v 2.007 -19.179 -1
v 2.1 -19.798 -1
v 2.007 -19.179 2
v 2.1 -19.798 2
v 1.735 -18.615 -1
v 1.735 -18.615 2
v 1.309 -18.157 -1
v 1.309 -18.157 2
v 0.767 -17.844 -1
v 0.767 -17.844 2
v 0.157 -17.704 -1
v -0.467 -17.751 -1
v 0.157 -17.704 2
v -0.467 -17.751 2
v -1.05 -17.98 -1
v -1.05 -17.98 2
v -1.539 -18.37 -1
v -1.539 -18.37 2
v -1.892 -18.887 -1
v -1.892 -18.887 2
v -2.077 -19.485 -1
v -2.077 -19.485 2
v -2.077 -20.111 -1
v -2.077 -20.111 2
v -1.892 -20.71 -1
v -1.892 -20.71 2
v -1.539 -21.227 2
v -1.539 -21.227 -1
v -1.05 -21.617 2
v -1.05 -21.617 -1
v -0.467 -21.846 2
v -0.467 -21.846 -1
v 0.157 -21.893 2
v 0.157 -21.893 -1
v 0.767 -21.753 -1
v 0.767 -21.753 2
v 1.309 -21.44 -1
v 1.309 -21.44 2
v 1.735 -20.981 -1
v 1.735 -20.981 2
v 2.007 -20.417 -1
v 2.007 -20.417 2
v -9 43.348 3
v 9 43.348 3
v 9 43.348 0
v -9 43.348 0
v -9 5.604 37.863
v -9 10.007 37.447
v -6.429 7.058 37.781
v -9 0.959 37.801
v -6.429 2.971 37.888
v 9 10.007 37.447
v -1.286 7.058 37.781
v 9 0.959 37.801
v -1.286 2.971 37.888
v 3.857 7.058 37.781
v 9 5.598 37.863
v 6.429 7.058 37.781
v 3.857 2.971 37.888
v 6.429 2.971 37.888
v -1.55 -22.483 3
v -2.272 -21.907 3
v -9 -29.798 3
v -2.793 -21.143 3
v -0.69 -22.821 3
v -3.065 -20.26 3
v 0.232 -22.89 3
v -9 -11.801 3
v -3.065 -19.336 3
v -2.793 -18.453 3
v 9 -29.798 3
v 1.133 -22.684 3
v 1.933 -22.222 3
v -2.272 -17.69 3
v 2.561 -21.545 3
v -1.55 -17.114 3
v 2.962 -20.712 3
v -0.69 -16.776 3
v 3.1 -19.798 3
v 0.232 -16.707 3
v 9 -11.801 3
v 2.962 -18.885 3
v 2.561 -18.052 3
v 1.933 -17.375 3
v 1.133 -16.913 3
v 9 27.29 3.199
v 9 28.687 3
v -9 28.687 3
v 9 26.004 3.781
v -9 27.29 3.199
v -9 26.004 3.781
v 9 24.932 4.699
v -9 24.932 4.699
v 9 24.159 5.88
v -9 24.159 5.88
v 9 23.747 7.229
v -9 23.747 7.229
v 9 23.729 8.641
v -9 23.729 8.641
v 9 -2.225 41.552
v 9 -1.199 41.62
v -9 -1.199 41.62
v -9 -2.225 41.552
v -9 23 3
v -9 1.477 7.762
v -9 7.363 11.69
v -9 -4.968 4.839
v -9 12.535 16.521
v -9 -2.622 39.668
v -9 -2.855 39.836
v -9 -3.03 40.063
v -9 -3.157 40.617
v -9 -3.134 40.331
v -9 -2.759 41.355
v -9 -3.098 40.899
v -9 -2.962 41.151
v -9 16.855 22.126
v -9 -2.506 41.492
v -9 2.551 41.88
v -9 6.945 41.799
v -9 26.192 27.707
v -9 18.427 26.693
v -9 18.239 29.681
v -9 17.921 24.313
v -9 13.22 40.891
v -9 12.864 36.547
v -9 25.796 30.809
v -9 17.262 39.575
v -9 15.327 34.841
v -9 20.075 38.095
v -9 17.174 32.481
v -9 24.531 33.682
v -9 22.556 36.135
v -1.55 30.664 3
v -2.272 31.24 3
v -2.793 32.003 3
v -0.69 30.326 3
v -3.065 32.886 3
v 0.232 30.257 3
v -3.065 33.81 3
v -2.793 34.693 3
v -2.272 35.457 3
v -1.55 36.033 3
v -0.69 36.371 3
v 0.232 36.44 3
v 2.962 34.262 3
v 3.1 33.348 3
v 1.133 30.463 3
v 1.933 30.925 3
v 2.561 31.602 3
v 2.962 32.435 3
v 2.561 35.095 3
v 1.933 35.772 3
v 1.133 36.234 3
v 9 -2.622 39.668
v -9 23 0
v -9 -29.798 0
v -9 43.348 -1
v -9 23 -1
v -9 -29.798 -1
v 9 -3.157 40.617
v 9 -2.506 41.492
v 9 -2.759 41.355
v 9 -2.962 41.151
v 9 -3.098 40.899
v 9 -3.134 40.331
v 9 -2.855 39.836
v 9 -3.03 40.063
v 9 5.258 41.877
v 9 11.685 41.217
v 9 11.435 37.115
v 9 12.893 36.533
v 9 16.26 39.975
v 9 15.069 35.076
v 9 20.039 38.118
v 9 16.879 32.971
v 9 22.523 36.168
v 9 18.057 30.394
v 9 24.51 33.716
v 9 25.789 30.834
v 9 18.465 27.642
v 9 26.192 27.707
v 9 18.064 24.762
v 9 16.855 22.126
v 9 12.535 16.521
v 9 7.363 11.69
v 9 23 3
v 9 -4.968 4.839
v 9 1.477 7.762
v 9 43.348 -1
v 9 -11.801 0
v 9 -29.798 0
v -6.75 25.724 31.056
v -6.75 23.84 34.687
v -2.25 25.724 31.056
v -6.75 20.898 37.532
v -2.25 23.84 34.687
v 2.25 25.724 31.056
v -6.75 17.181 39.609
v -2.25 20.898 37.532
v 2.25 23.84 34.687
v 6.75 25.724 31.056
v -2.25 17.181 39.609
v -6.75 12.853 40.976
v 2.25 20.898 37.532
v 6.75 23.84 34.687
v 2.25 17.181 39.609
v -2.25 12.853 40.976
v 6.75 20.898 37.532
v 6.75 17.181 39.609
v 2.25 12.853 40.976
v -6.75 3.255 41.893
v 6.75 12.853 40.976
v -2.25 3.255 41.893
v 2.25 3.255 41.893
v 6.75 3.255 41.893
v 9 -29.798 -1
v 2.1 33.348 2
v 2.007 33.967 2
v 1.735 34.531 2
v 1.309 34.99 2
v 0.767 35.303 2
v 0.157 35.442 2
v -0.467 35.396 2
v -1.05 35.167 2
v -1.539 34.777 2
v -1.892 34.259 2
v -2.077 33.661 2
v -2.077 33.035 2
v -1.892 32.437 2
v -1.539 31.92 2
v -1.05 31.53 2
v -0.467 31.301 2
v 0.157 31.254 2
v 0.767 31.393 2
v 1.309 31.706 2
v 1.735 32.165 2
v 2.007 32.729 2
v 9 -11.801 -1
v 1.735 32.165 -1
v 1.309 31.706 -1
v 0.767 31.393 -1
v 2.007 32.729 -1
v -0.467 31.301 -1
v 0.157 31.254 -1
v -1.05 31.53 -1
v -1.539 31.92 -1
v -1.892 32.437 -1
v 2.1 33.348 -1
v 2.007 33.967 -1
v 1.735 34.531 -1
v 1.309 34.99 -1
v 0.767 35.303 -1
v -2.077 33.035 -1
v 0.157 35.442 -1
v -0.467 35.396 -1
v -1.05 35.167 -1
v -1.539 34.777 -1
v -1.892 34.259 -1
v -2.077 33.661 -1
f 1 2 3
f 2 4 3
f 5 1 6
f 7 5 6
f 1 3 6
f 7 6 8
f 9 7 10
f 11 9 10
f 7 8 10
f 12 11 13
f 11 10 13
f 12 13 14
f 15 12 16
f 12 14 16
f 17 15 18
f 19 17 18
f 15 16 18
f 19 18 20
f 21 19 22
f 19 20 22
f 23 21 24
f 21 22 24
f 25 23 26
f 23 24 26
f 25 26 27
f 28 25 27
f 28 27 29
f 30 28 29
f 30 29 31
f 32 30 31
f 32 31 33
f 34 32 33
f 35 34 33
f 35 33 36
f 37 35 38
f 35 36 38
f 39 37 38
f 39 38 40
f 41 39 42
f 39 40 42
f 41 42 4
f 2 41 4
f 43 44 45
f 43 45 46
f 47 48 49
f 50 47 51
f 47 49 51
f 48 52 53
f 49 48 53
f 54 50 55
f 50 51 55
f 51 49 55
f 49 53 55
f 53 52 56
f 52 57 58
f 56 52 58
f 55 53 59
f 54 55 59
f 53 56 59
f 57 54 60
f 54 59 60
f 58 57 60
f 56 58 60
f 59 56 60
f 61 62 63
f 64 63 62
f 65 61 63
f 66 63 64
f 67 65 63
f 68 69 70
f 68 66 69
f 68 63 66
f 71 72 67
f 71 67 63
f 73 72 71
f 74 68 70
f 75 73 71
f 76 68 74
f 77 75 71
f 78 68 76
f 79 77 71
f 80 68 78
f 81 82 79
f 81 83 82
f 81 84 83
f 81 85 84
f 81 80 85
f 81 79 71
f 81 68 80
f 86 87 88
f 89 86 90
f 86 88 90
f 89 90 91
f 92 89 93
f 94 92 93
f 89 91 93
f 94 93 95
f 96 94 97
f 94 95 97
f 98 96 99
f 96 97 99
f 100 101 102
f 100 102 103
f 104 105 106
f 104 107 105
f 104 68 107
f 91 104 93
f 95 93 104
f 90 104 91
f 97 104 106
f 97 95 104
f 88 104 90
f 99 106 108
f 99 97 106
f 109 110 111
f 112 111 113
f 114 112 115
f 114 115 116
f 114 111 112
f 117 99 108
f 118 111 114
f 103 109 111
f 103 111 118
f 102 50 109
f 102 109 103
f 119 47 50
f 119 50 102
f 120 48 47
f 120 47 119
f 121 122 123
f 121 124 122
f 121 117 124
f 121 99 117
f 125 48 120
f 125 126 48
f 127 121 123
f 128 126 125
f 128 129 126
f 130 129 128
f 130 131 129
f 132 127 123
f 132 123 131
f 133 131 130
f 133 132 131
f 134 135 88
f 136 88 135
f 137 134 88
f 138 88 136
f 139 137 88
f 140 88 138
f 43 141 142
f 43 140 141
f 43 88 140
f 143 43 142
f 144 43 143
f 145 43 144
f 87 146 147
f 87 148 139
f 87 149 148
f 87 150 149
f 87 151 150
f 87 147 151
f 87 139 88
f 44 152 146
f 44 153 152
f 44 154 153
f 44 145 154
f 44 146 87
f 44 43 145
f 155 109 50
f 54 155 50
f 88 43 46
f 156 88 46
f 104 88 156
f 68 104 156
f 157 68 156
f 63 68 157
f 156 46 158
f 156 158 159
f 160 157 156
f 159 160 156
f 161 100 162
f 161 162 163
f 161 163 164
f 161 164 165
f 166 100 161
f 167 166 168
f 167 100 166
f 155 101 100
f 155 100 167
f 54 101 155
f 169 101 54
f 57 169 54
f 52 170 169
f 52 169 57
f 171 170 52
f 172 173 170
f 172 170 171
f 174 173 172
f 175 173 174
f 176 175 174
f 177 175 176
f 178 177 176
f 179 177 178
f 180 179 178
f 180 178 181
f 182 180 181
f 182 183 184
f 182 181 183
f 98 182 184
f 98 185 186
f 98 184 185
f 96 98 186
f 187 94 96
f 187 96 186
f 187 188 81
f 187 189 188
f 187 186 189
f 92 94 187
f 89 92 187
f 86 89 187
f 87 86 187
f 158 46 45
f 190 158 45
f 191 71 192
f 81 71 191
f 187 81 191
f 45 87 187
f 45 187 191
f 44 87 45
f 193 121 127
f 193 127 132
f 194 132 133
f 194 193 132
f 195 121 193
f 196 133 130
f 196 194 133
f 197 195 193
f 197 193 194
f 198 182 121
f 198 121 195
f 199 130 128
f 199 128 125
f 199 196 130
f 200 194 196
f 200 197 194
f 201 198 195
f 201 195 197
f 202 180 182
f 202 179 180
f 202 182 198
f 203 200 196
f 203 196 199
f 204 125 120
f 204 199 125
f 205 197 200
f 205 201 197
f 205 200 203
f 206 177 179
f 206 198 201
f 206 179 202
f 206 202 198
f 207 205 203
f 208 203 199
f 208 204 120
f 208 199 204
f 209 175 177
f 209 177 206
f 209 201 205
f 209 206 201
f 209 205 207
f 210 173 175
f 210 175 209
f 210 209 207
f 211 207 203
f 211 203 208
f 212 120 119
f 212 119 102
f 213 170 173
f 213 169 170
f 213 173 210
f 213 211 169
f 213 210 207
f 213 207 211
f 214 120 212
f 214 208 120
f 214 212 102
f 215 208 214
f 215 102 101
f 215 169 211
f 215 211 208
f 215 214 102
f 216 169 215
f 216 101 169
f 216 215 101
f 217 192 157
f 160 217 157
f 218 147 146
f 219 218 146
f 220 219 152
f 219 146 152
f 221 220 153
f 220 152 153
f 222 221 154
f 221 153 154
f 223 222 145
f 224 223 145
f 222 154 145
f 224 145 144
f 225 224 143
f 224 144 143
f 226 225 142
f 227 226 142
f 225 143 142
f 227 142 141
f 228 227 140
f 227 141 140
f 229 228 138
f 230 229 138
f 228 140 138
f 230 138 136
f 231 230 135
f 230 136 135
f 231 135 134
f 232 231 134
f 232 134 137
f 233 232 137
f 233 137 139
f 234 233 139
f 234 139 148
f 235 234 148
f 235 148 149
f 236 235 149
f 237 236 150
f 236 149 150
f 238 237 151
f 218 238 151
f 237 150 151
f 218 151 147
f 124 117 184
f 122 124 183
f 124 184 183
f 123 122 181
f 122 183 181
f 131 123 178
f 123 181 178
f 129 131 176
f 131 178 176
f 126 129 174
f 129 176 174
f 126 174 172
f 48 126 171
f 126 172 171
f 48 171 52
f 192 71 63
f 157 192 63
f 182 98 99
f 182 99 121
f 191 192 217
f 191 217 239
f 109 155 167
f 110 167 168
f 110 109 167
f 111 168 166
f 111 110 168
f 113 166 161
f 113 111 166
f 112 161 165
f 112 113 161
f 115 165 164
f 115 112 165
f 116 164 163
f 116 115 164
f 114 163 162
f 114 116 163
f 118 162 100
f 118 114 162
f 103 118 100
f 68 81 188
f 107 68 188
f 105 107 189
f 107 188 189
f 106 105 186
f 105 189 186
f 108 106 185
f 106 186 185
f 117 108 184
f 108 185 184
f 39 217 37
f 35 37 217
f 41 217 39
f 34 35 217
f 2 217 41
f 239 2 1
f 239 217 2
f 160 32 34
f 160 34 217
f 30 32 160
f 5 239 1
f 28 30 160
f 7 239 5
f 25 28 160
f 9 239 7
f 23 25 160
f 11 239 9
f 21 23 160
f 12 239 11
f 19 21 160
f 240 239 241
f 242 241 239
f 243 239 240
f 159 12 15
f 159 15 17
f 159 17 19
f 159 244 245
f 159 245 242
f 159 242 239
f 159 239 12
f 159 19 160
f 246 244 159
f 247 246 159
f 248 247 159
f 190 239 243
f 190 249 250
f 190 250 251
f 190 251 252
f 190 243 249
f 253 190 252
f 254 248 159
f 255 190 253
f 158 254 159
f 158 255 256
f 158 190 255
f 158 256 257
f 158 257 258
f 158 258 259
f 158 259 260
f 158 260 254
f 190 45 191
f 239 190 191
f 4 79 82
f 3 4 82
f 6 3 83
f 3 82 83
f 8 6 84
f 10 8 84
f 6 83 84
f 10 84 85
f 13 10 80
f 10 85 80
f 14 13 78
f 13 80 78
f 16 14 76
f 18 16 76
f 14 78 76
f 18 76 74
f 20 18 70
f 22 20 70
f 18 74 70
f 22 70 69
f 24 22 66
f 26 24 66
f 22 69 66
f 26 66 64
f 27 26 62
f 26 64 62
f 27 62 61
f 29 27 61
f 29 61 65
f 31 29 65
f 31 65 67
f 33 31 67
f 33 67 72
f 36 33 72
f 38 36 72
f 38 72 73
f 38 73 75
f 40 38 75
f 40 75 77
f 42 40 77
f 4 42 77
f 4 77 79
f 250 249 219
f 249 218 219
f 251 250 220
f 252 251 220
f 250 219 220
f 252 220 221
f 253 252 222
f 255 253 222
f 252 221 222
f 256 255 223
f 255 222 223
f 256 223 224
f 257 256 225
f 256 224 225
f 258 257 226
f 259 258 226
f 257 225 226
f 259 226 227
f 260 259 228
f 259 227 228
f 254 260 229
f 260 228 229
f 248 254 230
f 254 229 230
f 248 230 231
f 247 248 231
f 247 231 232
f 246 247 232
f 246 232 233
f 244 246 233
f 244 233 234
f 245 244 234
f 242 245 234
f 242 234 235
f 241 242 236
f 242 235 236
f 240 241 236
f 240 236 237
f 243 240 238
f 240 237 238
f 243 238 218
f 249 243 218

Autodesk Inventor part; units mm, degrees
ref_plane "YZ Plane" through (0, 0, 0) normal (1, 0, 0) x (0, 1, 0)
ref_plane "XZ Plane" through (0, 0, 0) normal (0, 1, 0) x (-1, 0, 0)
ref_plane "XY Plane" through (0, 0, 0) normal (0, 0, 1) x (1, 0, 0)
sketch "Boceto1" plane through (0, 0, 0) normal (0, 0, 1) x (1, 0, 0)
  line L0 (15, -35) -> (-15, -35)
  line L1 (-15, -35) -> (-15, 35)
  line L2 (-15, 35) -> (15, 35)
  line L3 (15, 35) -> (15, -35)
  line L4 (15, -35) -> (-15, 35) construction
  line L5 (-15, -35) -> (15, 35) construction
  line L6 (0, 35) -> (0, -35) construction
  circle A0 centre (0, 28.5) radius 2
  line L7 (-19.7941, 0) -> (22.4931, 0) construction
  circle A1 centre (0, -28.5) radius 2
  point P0 (0, 0)
  dimension "d0" = 70
  dimension "d1" = 30
  dimension "d2" = 4
  dimension "d3" = 6.5
  dimension "d4" = 6.5
extrude "Extrusión1" add sketch "Boceto1" along normal blind 3
sketch "Boceto2" plane through (15, -35, 0) normal (1, 0, 0) x (0, 0, -1)
  line L0 (-1.8712, 18.1097) -> (-14.4034, 50.7658) construction
  line L1 (-14.4034, 50.7658) -> (-23.5228, 61.8317) construction
  line L2 (-23.5228, 61.8317) -> (-35.5227, 59.996) construction
  line L3 (-35.5227, 59.996) -> (-40.0788, 48.4605) construction
  line L4 (-40.0788, 48.4605) -> (-40.0788, 37.855) construction
  line L5 (-40.0788, 37.855) -> (-39.6332, 34.0327) construction
  spline S0 degree 4 poles (-1.8712, 18.1097) (-14.4034, 50.7658) (-23.5228, 61.8317) (-35.5227, 59.996) (-40.0788, 48.4605) (-40.0788, 37.855) (-39.6332, 34.0327) knots 1 1 1 1 1 2 3 4 4 4 4 4 construction
  line L6 (-3, 61.5) -> (-3, 65.5) projected
  line L7 (-3, 0) -> (-3, 70) projected
  line L8 (-3, 70) -> (-3, 58)
  line L9 (-3, 58) -> (-27.7071, 61.1916)
  line L10 (-3, 58) -> (-3, 23.1988)
  line L11 (-41.6198, 33.8011) -> (-41.317, 29.2142)
  line L12 (-41.317, 29.2142) -> (-37.8007, 35.959)
  arc A0 (-3, 23.1988) -> (-31.2114, 56.3416) centre (-45.8049, 15.3413) ccw
  spline S1 degree 5 poles (-27.7071, 61.1916) (-28.3861, 61.204) (-29.0661, 61.164) (-29.7416, 61.0697) (-31.212, 60.7437) (-32.6066, 60.1691) (-33.3389, 59.7849) (-34.7268, 58.894) (-35.9529, 57.791) (-36.5222, 57.195) (-37.5948, 55.9044) (-38.4921, 54.486) (-38.9051, 53.737) (-39.672, 52.1477) (-40.273, 50.4882) (-40.5424, 49.6188) (-41.0222, 47.8089) (-41.3636, 45.9678) (-41.5068, 45.0158) (-41.7361, 43.0961) (-41.8573, 41.1666) (-41.8931, 40.1963) (-41.9162, 38.3325) (-41.8502, 36.4697) (-41.7977, 35.5781) (-41.7231, 34.688) (-41.6198, 33.8011) knots 0 0 0 0 0 0 0.098265 0.098265 0.098265 0.217274 0.217274 0.217274 0.336121 0.336121 0.336121 0.459615 0.459615 0.459615 0.591158 0.591158 0.591158 0.730365 0.730365 0.730365 0.870803 0.870803 0.870803 1 1 1 1 1 1
  spline S2 degree 5 poles (-31.2114, 56.3416) (-31.6636, 56.0965) (-32.095, 55.8132) (-32.503, 55.497) (-33.3156, 54.7706) (-34.0235, 53.9412) (-34.3681, 53.4813) (-35.0445, 52.4631) (-35.6063, 51.3769) (-35.8744, 50.7865) (-36.3876, 49.5038) (-36.7878, 48.1811) (-36.9721, 47.4711) (-37.3065, 45.9717) (-37.5429, 44.4536) (-37.643, 43.6569) (-37.8023, 42.0438) (-37.8811, 40.4248) (-37.9018, 39.607) (-37.9054, 38.386) (-37.8672, 37.1658) (-37.85, 36.7633) (-37.8279, 36.3609) (-37.8007, 35.959) knots 0 0 0 0 0 0 0.114517 0.114517 0.114517 0.242166 0.242166 0.242166 0.386331 0.386331 0.386331 0.549516 0.549516 0.549516 0.72821 0.72821 0.72821 0.910298 0.910298 0.910298 1 1 1 1 1 1
  point P0 (0, 35)
  point P1 (-17.4487, 48.3553)
  point P2 (-3, 11.1175)
  point P3 (-18.9631, 49.5979)
  dimension "d7" = 2
  dimension "d9" = 12
  dimension "d10" = 24.7071
  dimension "d32" = 34.8012
  dimension "d33" = 12.0812
  dimension "d34" = 9.1194
  dimension "d35" = 11.0659
  dimension "d36" = 32.6561
  dimension "d37" = 12.5322
  dimension "d38" = 43.5201
  dimension "d39" = 10.6055
  dimension "d40" = 3.5163
  dimension "d41" = 6.7448
  dimension "d42" = 34.8008
  dimension "d43" = 20.3826
  dimension "d44" = 1.6584
  dimension "d45" = 16.556
  dimension "d46" = 13.3712
extrude "Extrusión2" add sketch "Boceto2" against normal up to surface (30 mm away)
fillet "Empalme5" radius 10 1 edges at (0, 21.3416, 31.2114)
fillet "Empalme6" radius 1 1 edges at (0, -5.7858, 41.317)
sketch "Boceto3" plane through (15, -35, 0) normal (1, 0, 0) x (0, 0, -1)
  arc A0 (-41.552, 32.7748) -> (-39.6675, 32.3783) centre (-40.5542, 32.8406) ccw projected
  line L0 (-39.6675, 32.3783) -> (-37.8007, 35.959) projected
  spline S0 degree 5 poles (-37.8007, 35.959) (-37.8279, 36.3609) (-37.85, 36.7633) (-37.8672, 37.1658) (-37.9054, 38.386) (-37.9018, 39.607) (-37.8811, 40.4248) (-37.8125, 41.8353) (-37.6827, 43.2413) (-37.6167, 43.8317) (-37.5385, 44.4206) (-37.4469, 45.0073) knots 0 0 0 0 0 0 0.222024 0.222024 0.222024 0.672714 0.672714 0.672714 1 1 1 1 1 1 projected
  spline S1 degree 2 poles (-22.1255, 51.8554) (-35.0681, 60.2487) (-37.4469, 45.0073) knots 0 0 0 1 1 1 weights 1 0.543962 1 projected
  arc A1 (-3, 23.1988) -> (-22.1255, 51.8554) centre (-45.8049, 15.3413) ccw projected
  line L1 (-3, 0) -> (-3, 23.1988) projected
  line L2 (0, 0) -> (-3, 0) projected
  line L3 (0, 70) -> (0, 0) projected
  line L4 (0, 70) -> (-3, 70) projected
  line L5 (-3, 58) -> (-3, 70) projected
  line L6 (-3, 58) -> (-27.7071, 61.1916) projected
  spline S2 degree 5 poles (-27.7071, 61.1916) (-28.3861, 61.204) (-29.0661, 61.164) (-29.7416, 61.0697) (-31.212, 60.7437) (-32.6066, 60.1691) (-33.3389, 59.7849) (-34.7268, 58.894) (-35.9529, 57.791) (-36.5222, 57.195) (-37.5948, 55.9044) (-38.4921, 54.486) (-38.9051, 53.737) (-39.672, 52.1477) (-40.273, 50.4882) (-40.5424, 49.6188) (-41.0222, 47.8089) (-41.3636, 45.9678) (-41.5068, 45.0158) (-41.7361, 43.0961) (-41.8573, 41.1666) (-41.8931, 40.1963) (-41.9162, 38.3325) (-41.8502, 36.4697) (-41.7977, 35.5781) (-41.7231, 34.688) (-41.6198, 33.8011) knots 0 0 0 0 0 0 0.098265 0.098265 0.098265 0.217274 0.217274 0.217274 0.336121 0.336121 0.336121 0.459615 0.459615 0.459615 0.591158 0.591158 0.591158 0.730365 0.730365 0.730365 0.870803 0.870803 0.870803 1 1 1 1 1 1 projected
  line L7 (-41.6198, 33.8011) -> (-41.552, 32.7748) projected
  line L8 (-3, 58) -> (-3, 23.1988)
  point P0 (0, 35)
extrude "Extrusión3" cut sketch "Boceto3" against normal blind 6 contours L7 S2 L6 L8 A1 S1 S0 L0 A0
sketch "Boceto4" plane through (-15, -35, 0) normal (-1, 0, 0) x (0, 0, 1)
  arc A0 (41.552, 32.7748) -> (39.6675, 32.3783) centre (40.5542, 32.8406) ccw projected
  line L0 (41.6198, 33.8011) -> (41.552, 32.7748) projected
  spline S0 degree 3 poles (27.7071, 61.1916) (29.0874, 61.2167) (30.4423, 60.9813) (33.0627, 59.9896) (34.2716, 59.2392) (36.6603, 57.1563) (37.7384, 55.7597) (39.8454, 52.037) (40.6354, 49.5891) (42.0928, 42.3499) (42.0185, 37.2222) (41.6198, 33.8011) knots 0 0 0 0 0.414156 0.414156 0.839985 0.839985 1.363183 1.363183 2.115437 2.115437 3.566985 3.566985 3.566985 3.566985 projected
  line L1 (3, 58) -> (27.7071, 61.1916) projected
  arc A1 (22.1255, 51.8554) -> (3, 23.1988) centre (45.8049, 15.3413) ccw projected
  spline S1 degree 3 poles (37.4469, 45.0073) (37.2461, 46.2939) (36.7959, 47.529) (35.4475, 49.757) (34.5621, 50.7287) (32.4688, 52.2779) (31.2808, 52.8407) (28.756, 53.4793) (27.4433, 53.5489) (25.4381, 53.2629) (24.7351, 53.0833) (23.3803, 52.5756) (22.7324, 52.2491) (22.1255, 51.8554) knots 0 0 0 0 0.390644 0.390644 0.781289 0.781289 1.171933 1.171933 1.562578 1.562578 1.779598 1.779598 1.996619 1.996619 1.996619 1.996619 projected
  spline S2 degree 3 poles (37.8007, 35.959) (37.9656, 38.3979) (37.96, 41.7196) (37.4469, 45.0073) knots 0 0 0 0 0.733359 0.733359 0.733359 0.733359 projected
  line L2 (39.6675, 32.3783) -> (37.8007, 35.959) projected
  line L3 (3, 58) -> (3, 23.1988) projected
  line L4 (3, 58) -> (3, 23.1988)
  arc A2 (41.552, 32.7748) -> (39.6675, 32.3783) centre (40.5542, 32.8406) ccw projected
  line L5 (41.6198, 33.8011) -> (41.552, 32.7748) projected
  spline S3 degree 3 poles (27.7071, 61.1916) (29.0874, 61.2167) (30.4423, 60.9813) (33.0627, 59.9896) (34.2716, 59.2392) (36.6603, 57.1563) (37.7384, 55.7597) (39.8454, 52.037) (40.6354, 49.5891) (42.0928, 42.3499) (42.0185, 37.2222) (41.6198, 33.8011) knots 0 0 0 0 0.414156 0.414156 0.839985 0.839985 1.363183 1.363183 2.115437 2.115437 3.566985 3.566985 3.566985 3.566985 projected
  line L6 (3, 58) -> (27.7071, 61.1916) projected
  arc A3 (22.1255, 51.8554) -> (3, 23.1988) centre (45.8049, 15.3413) ccw projected
  spline S4 degree 3 poles (37.4469, 45.0073) (37.2461, 46.2939) (36.7959, 47.529) (35.4475, 49.757) (34.5621, 50.7287) (32.4688, 52.2779) (31.2808, 52.8407) (28.756, 53.4793) (27.4433, 53.5489) (25.4381, 53.2629) (24.7351, 53.0833) (23.3803, 52.5756) (22.7324, 52.2491) (22.1255, 51.8554) knots 0 0 0 0 0.390644 0.390644 0.781289 0.781289 1.171933 1.171933 1.562578 1.562578 1.779598 1.779598 1.996619 1.996619 1.996619 1.996619 projected
  spline S5 degree 3 poles (37.8007, 35.959) (37.9656, 38.3979) (37.96, 41.7196) (37.4469, 45.0073) knots 0 0 0 0 0.733359 0.733359 0.733359 0.733359 projected
  line L7 (39.6675, 32.3783) -> (37.8007, 35.959) projected
  circle A4 centre (40.5542, 32.8406) radius 1
  point P0 (0, 35)
extrude "Extrusión4" cut sketch "Boceto4" against normal blind 6
sketch "Boceto5" plane through (0, 0, 3) normal (0, 0, 1) x (1, 0, 0)
  circle A0 centre (0, -28.5) radius 2 projected
  circle A1 centre (0, -28.5) radius 4.6184
  circle A2 centre (0, 28.5) radius 2 projected
  circle A3 centre (0, 28.5) radius 3.6227
  point P0 (0, 0)
extrude "Extrusión5" add sketch "Boceto5" against normal up to surface (3 mm away) contours A0 | A2
sketch "Boceto6" plane through (0, 0, 3) normal (0, 0, 1) x (1, 0, 0)
  circle A0 centre (0, -19.7984) radius 2.1
  line L0 (-14.9492, 6.775) -> (15, 6.775) construction
  line L1 (15, -35) -> (15, 35) projected
  line L2 (11, 25.275) -> (-11, 25.275) projected
  line L3 (9, -11.8012) -> (-9, -11.8012) projected
  circle A1 centre (0, 33.3483) radius 2.1
  line L4 (-15, -35) -> (15, -35) projected
  line L5 (-15, 35) -> (-15, -35) projected
  point P0 (0, 0)
  point P1 (11, -11.8012)
  point P2 (-11, -11.8012)
  dimension "d66" = 4.2
  dimension "d67" = 15.2016
  dimension "d68" = 15
sketch "Boceto7" plane through (0, 0, 3) normal (0, 0, 1) x (1, 0, 0)
  line L0 (-15, -35) -> (15, -35) projected
  line L1 (15, -35) -> (15, 35) projected
  line L2 (-15, -35) -> (15, -35)
  line L3 (15, -35) -> (15, -29.7984)
  line L4 (15, -29.7984) -> (-15, -29.7984)
  line L5 (-15, -29.7984) -> (-15, -35)
  circle A0 centre (0, -19.7984) radius 2.1 projected
  point P0 (0, 0)
  dimension "d51" = 10
extrude "Extrusión6" cut sketch "Boceto7" against normal blind 7 contours L5 L4 L1 L0
sketch "Boceto8" plane through (0, 0, 3) normal (0, 0, 1) x (1, 0, 0)
  line L0 (-15, 35) -> (15, 35)
  line L1 (15, 35) -> (15, 43.3483)
  line L2 (15, 43.3483) -> (-15, 43.3483)
  line L3 (-15, 43.3483) -> (-15, 35)
  circle A0 centre (0, 33.3483) radius 2.1 projected
  point P0 (0, 0)
  dimension "d54" = 10
extrude "Extrusión7" add sketch "Boceto8" against normal up to surface (3 mm away) contours L3 L2 L1 L0 A0 | A0 L0 picked at (-0.3005, 35.0816)
sketch "Boceto9" plane through (0, 0, 3) normal (0, 0, 1) x (1, 0, 0)
  line L0 (15, 43.3483) -> (-15, 43.3483) projected
  line L1 (9, -29.7984) -> (9, 43.3483)
  line L2 (-9, 43.3483) -> (-9, -29.7984)
  line L3 (-15, -29.7984) -> (15, -29.7984) projected
  line L4 (-9, -11.8012) -> (-9, 23) projected
  line L5 (9, 23) -> (9, -11.8012) projected
  line L6 (-15, 43.3483) -> (-15, -29.7984) projected
  line L7 (-9, -29.7984) -> (-15, -29.7984)
  line L8 (-15, -29.7984) -> (-15, 43.3483)
  line L9 (-15, 43.3483) -> (-9, 43.3483)
  line L10 (-9, 43.3483) -> (-9, -29.7984)
  line L11 (15, -29.7984) -> (15, 43.3483) projected
  line L12 (9, 43.3483) -> (15, 43.3483)
  line L13 (15, 43.3483) -> (15, -29.7984)
  line L14 (15, -29.7984) -> (9, -29.7984)
  line L15 (9, -29.7984) -> (9, 43.3483)
  point P0 (0, 0)
extrude "Extrusión8" cut sketch "Boceto9" against normal blind 7 contours L11 L3 L1 L0 | L2 L3 L6 L0
sketch "Boceto10" plane through (0, 0, 0) normal (0, 0, -1) x (-1, 0, 0)
  line L0 (9, 43.3483) -> (9, 23) projected
  line L1 (-9, -29.7984) -> (-9, -11.8012) projected
  line L2 (9, 43.3483) -> (-9, 43.3483)
  line L3 (-9, 43.3483) -> (-9, -29.7984)
  line L4 (-9, -29.7984) -> (9, -29.7984)
  line L5 (9, -29.7984) -> (9, 43.3483)
  point P0 (0, 0)
extrude "Extrusión9" add sketch "Boceto10" along normal blind 1
extrude "Extrusión10" cut sketch "Boceto6" against normal up to surface (4 mm away)
chamfer "Chaflán1" distance 1 angle 45 2 edges at (-2.1, -19.7984, 3) (-2.1, 33.3483, 3)
fillet "Empalme8" radius 5 1 edges at (0, 23, 3)
equation "\"d4\" = d3"
properties part number "CoronaVirus"
